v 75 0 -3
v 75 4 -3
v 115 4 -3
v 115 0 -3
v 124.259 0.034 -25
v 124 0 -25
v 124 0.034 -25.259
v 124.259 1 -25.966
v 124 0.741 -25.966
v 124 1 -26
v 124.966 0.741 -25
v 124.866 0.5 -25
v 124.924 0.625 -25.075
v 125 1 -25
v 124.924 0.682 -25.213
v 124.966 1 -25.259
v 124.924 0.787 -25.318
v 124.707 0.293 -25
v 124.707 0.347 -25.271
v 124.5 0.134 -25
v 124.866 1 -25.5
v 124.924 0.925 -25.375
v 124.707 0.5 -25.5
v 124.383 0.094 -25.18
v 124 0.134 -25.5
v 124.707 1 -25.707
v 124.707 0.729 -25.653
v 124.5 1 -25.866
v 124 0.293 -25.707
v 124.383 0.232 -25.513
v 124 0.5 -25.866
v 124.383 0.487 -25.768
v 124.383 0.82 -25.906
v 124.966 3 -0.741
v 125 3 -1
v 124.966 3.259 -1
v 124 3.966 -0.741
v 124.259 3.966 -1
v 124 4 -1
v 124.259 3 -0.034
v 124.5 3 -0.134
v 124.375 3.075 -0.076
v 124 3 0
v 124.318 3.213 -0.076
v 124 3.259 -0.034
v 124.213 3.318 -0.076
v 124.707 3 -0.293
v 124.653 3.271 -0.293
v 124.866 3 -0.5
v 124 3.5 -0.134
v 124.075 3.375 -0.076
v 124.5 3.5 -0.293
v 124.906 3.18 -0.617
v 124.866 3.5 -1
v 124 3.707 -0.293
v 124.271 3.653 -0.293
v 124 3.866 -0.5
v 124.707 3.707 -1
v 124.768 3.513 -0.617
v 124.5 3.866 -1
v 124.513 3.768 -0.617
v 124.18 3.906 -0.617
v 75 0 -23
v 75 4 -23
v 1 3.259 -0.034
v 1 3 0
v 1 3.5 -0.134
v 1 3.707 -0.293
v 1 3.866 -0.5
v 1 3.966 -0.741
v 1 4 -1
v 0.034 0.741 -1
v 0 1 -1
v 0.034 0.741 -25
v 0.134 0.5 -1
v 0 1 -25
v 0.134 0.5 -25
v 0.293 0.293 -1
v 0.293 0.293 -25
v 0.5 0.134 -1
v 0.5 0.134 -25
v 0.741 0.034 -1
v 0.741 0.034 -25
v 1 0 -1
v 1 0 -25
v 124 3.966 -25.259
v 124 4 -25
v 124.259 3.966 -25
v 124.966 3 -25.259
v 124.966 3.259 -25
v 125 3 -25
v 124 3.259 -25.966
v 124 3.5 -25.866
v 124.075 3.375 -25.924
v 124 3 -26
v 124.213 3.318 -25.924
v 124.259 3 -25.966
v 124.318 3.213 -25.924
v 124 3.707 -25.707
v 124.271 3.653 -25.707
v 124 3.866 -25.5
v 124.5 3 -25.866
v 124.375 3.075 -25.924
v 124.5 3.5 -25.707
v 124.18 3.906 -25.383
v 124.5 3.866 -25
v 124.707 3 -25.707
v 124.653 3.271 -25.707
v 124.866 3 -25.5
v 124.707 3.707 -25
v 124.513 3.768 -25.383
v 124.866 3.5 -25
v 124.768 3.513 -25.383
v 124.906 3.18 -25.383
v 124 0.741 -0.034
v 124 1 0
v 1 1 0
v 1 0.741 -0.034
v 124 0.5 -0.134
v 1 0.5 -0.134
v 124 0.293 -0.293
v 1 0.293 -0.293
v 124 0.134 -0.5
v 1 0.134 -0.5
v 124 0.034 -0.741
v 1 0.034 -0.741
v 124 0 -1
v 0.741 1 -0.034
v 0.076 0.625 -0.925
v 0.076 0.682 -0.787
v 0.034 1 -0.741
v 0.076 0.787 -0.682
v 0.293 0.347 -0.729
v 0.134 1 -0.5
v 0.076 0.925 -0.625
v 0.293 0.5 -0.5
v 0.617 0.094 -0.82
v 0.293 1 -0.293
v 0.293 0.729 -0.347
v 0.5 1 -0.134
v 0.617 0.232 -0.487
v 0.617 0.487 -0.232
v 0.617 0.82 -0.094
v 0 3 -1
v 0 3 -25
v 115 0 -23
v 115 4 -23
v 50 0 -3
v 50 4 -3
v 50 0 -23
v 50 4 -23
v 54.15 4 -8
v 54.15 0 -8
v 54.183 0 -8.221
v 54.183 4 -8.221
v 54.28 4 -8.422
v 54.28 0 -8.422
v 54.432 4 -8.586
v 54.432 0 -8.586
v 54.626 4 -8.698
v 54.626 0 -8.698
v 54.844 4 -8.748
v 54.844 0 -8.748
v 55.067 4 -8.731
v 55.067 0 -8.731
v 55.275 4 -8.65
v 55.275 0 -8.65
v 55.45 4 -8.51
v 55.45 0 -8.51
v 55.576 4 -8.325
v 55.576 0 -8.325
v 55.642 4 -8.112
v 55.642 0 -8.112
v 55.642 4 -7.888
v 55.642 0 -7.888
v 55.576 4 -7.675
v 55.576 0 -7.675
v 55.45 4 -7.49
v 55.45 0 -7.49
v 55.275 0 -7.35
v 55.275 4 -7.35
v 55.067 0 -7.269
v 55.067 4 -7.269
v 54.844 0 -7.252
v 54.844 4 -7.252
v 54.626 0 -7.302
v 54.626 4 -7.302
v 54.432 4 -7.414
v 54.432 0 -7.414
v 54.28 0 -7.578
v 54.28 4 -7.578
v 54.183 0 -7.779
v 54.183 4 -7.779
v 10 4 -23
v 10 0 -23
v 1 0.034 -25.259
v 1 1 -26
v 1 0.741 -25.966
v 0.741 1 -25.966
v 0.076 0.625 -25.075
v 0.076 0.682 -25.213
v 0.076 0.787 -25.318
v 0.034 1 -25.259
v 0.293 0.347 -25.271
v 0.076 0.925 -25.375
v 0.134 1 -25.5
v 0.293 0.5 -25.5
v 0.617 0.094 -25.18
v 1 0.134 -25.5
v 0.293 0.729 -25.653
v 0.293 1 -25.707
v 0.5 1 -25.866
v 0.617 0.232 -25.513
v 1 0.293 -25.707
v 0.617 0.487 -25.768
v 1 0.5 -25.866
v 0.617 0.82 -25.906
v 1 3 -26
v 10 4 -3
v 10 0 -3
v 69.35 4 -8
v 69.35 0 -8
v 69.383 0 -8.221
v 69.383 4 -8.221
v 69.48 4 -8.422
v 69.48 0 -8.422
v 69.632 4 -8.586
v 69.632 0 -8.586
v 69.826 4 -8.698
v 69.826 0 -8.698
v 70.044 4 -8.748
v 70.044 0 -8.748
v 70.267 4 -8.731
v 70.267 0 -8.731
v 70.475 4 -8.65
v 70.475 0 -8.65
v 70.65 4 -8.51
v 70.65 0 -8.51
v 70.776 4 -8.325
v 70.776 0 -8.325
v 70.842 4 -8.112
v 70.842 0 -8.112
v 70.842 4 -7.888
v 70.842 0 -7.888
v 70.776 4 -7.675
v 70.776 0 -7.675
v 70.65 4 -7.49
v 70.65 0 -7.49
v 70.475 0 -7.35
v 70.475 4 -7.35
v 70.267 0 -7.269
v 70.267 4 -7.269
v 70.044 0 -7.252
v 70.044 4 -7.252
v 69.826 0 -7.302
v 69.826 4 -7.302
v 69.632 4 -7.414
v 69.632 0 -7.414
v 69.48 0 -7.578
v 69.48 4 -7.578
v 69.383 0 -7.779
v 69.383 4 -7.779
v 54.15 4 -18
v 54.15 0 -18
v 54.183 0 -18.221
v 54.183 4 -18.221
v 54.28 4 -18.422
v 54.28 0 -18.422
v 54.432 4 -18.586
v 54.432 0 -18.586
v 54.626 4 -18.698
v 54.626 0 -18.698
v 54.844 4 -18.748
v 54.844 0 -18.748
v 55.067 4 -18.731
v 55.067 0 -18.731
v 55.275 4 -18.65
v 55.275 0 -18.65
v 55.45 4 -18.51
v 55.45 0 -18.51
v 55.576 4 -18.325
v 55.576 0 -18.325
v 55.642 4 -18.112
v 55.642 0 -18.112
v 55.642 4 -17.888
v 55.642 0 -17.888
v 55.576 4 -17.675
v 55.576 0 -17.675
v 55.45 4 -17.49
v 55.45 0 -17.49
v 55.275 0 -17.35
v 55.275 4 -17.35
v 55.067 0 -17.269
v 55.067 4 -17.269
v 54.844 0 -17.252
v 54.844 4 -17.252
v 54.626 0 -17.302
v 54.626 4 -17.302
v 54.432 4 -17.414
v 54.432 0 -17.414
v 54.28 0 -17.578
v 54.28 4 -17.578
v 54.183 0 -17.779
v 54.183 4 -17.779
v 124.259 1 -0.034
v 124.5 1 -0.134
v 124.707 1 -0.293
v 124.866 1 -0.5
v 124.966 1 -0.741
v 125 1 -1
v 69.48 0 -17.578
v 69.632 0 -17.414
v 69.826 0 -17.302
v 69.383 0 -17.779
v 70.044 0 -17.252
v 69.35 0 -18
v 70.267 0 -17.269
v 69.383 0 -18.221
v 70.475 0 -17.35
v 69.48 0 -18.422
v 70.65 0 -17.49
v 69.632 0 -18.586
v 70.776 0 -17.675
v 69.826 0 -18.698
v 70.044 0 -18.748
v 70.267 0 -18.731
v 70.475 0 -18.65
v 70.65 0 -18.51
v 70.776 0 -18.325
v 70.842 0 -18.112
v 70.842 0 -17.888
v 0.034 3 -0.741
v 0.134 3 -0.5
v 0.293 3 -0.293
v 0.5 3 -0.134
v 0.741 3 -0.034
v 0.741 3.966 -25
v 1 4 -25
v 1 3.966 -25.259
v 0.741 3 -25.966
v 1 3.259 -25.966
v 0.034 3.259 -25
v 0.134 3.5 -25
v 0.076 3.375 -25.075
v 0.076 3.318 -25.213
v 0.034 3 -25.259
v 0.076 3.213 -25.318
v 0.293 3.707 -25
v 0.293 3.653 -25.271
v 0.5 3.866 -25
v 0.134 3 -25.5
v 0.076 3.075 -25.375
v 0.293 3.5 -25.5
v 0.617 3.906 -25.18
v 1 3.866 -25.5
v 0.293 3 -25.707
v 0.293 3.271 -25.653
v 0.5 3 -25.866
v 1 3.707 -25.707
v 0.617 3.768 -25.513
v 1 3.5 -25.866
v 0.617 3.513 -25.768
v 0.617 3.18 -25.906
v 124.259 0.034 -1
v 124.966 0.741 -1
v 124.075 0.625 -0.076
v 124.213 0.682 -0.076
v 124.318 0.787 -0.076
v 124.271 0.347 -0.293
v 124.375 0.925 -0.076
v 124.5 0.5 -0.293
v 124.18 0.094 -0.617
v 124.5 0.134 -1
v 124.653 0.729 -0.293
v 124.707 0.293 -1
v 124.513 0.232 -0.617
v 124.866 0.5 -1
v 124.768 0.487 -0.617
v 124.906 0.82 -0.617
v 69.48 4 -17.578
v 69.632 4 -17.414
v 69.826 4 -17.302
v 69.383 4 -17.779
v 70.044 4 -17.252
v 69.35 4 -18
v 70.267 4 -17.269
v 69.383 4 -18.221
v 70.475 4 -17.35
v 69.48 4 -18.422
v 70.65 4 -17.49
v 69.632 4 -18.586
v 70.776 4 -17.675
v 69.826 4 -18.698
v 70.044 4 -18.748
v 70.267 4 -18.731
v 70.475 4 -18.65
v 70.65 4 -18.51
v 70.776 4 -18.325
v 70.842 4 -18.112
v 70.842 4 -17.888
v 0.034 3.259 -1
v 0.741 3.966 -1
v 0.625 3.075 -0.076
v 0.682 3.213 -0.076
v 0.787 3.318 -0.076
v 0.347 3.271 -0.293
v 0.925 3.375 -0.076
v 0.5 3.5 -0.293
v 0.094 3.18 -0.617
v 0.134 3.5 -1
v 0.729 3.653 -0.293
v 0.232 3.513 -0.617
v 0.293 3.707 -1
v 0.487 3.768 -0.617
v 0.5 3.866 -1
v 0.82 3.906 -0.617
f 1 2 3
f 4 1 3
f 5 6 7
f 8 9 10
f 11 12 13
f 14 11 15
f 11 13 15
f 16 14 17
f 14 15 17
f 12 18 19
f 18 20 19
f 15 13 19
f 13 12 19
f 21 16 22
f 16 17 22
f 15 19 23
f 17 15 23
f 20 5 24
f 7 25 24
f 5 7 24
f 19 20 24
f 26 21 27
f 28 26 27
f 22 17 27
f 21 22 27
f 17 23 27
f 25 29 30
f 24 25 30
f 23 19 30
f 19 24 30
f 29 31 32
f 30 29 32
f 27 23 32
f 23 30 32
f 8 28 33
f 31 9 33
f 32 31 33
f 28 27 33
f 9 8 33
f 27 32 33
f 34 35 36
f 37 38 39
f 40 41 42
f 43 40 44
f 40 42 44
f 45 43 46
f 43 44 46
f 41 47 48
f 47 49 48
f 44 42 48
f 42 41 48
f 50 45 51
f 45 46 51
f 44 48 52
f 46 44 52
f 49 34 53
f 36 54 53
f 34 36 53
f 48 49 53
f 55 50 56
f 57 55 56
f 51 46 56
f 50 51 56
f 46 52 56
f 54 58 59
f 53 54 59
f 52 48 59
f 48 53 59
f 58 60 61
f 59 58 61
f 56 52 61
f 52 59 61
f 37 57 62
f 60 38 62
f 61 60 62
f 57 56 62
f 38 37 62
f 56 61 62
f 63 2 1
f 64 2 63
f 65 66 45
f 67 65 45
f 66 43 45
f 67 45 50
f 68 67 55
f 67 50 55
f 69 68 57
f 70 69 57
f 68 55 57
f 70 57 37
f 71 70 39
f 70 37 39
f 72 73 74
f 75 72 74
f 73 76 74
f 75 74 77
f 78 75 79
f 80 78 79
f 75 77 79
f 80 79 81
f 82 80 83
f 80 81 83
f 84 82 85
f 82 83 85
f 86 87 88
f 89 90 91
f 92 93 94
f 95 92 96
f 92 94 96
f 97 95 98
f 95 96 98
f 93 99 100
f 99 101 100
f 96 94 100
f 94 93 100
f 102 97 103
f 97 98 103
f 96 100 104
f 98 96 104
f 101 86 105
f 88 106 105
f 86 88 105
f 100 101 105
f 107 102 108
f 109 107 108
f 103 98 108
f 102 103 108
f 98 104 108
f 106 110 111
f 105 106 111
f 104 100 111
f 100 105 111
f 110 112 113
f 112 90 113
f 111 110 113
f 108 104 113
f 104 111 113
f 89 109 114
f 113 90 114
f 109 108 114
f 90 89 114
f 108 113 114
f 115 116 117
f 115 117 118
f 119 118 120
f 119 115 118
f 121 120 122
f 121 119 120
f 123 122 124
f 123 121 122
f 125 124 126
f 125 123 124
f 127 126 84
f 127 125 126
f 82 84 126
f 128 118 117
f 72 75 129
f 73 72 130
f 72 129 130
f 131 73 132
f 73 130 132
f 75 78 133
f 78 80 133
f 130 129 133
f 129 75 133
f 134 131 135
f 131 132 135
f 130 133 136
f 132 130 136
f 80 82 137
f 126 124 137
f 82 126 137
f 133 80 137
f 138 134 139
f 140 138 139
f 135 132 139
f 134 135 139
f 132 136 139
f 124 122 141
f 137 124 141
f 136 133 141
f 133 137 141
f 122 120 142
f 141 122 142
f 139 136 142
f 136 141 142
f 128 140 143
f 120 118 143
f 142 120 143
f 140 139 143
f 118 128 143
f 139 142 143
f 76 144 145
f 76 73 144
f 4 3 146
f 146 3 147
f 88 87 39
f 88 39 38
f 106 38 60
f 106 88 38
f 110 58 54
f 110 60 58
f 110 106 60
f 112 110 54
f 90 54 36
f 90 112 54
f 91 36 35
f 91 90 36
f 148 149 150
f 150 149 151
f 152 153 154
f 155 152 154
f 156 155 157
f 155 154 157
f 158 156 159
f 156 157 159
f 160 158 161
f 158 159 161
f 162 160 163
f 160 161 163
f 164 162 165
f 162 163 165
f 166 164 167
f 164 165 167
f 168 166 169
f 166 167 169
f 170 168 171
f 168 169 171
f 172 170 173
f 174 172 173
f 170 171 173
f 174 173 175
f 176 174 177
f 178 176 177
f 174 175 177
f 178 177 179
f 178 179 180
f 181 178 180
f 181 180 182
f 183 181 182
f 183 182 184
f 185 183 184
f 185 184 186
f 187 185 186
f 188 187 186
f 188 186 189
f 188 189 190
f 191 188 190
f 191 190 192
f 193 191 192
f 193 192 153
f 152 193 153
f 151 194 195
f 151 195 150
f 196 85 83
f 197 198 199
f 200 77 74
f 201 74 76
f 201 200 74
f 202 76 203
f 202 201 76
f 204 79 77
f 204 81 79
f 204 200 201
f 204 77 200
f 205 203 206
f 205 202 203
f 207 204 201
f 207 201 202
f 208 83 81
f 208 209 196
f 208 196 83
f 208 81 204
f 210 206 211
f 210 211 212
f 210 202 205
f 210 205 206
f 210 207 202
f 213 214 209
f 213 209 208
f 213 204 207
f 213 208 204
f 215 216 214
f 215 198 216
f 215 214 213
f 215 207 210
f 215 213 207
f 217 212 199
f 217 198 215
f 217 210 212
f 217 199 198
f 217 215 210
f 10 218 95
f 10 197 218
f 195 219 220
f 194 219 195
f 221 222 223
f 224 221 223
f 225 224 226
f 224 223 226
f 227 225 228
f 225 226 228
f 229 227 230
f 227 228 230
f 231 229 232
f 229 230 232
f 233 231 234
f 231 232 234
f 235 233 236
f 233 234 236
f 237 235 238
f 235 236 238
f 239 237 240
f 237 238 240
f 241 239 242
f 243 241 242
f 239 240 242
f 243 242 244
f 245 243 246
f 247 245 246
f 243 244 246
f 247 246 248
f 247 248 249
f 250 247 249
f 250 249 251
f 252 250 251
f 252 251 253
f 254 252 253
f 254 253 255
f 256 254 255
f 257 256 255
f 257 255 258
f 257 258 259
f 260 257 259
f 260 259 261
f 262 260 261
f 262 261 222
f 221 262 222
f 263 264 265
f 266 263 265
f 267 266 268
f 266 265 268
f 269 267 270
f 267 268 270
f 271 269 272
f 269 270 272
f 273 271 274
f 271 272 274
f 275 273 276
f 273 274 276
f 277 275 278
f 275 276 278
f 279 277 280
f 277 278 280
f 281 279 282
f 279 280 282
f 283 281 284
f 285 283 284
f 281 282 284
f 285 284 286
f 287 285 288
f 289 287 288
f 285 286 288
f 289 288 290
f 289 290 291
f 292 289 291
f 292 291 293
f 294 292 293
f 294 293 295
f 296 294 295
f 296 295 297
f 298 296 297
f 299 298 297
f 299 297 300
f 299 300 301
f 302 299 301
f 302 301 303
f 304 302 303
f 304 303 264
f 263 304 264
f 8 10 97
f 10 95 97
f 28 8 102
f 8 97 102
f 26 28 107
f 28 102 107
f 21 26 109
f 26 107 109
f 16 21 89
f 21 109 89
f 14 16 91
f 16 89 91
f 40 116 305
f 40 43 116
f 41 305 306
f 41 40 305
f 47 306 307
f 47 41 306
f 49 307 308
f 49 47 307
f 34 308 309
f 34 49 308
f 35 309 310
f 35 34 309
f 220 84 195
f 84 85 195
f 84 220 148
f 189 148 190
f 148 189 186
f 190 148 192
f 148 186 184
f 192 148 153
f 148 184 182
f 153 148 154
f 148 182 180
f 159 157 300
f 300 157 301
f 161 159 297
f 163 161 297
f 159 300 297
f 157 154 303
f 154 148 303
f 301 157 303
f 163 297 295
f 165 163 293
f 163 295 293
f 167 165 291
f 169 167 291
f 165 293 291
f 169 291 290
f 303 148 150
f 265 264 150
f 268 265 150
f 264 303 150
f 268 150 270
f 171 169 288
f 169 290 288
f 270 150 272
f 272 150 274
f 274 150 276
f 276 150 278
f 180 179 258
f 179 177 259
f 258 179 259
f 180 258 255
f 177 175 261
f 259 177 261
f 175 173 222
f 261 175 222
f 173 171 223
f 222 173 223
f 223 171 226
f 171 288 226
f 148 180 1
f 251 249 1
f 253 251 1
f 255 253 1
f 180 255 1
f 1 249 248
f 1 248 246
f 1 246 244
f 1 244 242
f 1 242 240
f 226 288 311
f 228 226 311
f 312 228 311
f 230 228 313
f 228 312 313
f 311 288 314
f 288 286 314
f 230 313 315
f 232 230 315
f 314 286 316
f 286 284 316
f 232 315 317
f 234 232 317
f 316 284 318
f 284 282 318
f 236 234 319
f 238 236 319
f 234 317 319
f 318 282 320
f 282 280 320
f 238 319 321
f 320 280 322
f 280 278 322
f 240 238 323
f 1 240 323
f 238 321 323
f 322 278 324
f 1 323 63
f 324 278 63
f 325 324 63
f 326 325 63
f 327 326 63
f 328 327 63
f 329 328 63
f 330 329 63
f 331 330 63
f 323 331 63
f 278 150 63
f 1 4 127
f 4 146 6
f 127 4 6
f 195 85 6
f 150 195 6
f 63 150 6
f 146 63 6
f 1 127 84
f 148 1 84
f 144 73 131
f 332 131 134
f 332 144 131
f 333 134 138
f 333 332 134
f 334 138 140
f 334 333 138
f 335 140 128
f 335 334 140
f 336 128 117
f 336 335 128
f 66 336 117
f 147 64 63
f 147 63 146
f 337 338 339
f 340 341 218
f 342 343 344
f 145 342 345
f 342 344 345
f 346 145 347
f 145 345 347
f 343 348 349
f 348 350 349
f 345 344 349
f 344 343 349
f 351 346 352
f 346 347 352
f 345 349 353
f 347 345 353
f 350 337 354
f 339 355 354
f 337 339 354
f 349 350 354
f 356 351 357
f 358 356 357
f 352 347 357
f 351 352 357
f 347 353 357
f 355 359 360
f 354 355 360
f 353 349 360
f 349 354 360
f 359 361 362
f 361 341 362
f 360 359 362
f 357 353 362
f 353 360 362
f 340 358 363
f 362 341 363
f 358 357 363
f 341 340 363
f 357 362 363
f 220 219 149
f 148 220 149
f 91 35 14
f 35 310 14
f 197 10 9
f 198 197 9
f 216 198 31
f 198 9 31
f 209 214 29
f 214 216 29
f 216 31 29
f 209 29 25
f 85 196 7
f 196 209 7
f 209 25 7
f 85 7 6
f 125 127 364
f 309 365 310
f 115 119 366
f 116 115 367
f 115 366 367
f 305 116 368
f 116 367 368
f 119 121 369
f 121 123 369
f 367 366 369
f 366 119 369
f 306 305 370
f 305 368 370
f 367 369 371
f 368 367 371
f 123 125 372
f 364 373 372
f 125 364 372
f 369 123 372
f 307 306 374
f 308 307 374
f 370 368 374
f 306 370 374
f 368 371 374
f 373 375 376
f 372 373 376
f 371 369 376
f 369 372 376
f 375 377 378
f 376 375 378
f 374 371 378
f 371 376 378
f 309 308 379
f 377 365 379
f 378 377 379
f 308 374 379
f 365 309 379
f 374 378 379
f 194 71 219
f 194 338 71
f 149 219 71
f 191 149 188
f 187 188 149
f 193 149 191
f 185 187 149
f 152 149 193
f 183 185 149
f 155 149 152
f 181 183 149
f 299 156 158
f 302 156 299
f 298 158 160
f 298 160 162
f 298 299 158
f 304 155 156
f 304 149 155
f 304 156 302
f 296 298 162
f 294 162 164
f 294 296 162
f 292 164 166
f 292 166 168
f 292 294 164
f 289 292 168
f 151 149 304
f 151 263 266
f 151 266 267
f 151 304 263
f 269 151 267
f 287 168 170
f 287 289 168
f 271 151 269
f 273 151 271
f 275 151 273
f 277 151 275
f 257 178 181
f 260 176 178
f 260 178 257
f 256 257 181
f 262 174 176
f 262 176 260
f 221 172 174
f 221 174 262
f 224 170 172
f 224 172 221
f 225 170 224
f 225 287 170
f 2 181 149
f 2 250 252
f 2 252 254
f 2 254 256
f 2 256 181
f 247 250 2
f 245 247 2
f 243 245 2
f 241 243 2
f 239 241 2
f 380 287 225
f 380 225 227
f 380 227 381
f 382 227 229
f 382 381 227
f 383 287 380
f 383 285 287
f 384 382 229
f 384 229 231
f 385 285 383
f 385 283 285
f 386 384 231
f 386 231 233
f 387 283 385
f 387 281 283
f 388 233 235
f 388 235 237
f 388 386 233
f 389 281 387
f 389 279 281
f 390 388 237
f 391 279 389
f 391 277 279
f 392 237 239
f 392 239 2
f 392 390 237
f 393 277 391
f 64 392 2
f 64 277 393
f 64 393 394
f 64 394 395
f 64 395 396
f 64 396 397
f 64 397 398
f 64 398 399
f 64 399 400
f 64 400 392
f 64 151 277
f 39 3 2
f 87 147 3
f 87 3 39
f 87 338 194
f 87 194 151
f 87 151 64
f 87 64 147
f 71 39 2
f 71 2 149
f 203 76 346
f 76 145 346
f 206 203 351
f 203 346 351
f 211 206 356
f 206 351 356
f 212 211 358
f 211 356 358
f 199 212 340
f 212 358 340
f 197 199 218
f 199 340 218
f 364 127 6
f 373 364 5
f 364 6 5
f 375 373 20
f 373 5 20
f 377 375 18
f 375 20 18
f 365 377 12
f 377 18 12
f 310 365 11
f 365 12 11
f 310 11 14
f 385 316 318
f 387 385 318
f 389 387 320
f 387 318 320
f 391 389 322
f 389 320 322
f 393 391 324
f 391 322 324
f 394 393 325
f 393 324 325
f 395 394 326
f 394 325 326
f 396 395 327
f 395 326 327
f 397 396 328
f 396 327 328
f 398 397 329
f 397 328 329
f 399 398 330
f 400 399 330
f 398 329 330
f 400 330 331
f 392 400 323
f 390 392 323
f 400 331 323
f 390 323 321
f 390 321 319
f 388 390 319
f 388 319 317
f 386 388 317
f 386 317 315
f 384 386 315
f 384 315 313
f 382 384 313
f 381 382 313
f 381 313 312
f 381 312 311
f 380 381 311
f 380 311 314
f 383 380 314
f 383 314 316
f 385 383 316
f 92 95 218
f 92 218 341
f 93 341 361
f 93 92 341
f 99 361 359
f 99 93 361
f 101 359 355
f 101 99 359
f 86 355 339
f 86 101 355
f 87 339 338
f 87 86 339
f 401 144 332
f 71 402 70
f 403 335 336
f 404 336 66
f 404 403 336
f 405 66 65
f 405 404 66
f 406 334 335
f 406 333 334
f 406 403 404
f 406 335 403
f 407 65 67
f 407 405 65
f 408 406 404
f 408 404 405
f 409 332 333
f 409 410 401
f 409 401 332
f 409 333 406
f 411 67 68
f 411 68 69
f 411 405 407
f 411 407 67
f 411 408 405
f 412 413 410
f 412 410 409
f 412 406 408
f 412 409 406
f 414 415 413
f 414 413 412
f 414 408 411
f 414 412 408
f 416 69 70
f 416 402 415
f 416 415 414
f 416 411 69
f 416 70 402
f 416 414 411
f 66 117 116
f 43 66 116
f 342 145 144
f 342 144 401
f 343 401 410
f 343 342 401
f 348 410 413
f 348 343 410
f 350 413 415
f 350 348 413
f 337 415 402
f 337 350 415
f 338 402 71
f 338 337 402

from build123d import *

# Parameters (mm, degrees)
SKETCH1_W                 = 125
SKETCH1_H                 = 26
BOSS_EXTRUDE1_DEPTH       = 4
SKETCH2_W                 = 40
SKETCH2_H                 = 20
CUT_EXTRUDE1_DEPTH        = 4
FILLET5_R                 = 1
F_1_5MM_DOWEL_HOLE1_D     = 1.5
F_1_5MM_DOWEL_HOLE1_DEPTH = 8
F_1_5MM_DOWEL_HOLE1_TIP   = 0.450645464


with BuildPart() as part:
    # Sketch1 → Boss-Extrude1 (new body)
    with BuildSketch(Plane(origin=(0, 0, 0), x_dir=(1, 0, 0), z_dir=(0, 1, 0))):
        with Locations((62.5, 13)):
            Rectangle(SKETCH1_W, SKETCH1_H)
    extrude(amount=BOSS_EXTRUDE1_DEPTH)

    # Sketch2 → Cut-Extrude1 (cut)
    with BuildSketch(Plane(origin=(0, 4, 0), x_dir=(1, 0, 0), z_dir=(0, 1, 0))):
        with Locations((30, 13)):
            Rectangle(SKETCH2_W, SKETCH2_H)
        with Locations((95, 13)):
            Rectangle(SKETCH2_W, SKETCH2_H)
    extrude(amount=-CUT_EXTRUDE1_DEPTH, mode=Mode.SUBTRACT)

    # Fillet5
    fillet5_edges = [part.edges().sort_by_distance(p)[0] for p in [
        (125, 4, -13),
        (62.5, 4, -26),
        (0, 4, -13),
        (62.5, 0, -26),
        (125, 0, -13),
        (62.5, 0, 0),
        (0, 0, -13),
        (0, 2, -26),
        (125, 2, -26),
        (125, 2, 0),
        (0, 2, 0),
        (62.5, 4, 0),
    ]]
    fillet(fillet5_edges, radius=FILLET5_R)

    # Ø1.5mm Dowel Hole1
    with Locations(Plane(origin=(0, 4, 0), x_dir=(1, 0, 0), z_dir=(0, 1, 0))):
        with Locations((54.9, 8), (54.9, 18), (70.1, 18), (70.1, 8)):
            Hole(F_1_5MM_DOWEL_HOLE1_D / 2, depth=F_1_5MM_DOWEL_HOLE1_DEPTH)
            with Locations((0, 0, -(F_1_5MM_DOWEL_HOLE1_DEPTH + F_1_5MM_DOWEL_HOLE1_TIP / 2))):  # 118° drill point
                Cone(0, F_1_5MM_DOWEL_HOLE1_D / 2, F_1_5MM_DOWEL_HOLE1_TIP, mode=Mode.SUBTRACT)


solid = part.part
